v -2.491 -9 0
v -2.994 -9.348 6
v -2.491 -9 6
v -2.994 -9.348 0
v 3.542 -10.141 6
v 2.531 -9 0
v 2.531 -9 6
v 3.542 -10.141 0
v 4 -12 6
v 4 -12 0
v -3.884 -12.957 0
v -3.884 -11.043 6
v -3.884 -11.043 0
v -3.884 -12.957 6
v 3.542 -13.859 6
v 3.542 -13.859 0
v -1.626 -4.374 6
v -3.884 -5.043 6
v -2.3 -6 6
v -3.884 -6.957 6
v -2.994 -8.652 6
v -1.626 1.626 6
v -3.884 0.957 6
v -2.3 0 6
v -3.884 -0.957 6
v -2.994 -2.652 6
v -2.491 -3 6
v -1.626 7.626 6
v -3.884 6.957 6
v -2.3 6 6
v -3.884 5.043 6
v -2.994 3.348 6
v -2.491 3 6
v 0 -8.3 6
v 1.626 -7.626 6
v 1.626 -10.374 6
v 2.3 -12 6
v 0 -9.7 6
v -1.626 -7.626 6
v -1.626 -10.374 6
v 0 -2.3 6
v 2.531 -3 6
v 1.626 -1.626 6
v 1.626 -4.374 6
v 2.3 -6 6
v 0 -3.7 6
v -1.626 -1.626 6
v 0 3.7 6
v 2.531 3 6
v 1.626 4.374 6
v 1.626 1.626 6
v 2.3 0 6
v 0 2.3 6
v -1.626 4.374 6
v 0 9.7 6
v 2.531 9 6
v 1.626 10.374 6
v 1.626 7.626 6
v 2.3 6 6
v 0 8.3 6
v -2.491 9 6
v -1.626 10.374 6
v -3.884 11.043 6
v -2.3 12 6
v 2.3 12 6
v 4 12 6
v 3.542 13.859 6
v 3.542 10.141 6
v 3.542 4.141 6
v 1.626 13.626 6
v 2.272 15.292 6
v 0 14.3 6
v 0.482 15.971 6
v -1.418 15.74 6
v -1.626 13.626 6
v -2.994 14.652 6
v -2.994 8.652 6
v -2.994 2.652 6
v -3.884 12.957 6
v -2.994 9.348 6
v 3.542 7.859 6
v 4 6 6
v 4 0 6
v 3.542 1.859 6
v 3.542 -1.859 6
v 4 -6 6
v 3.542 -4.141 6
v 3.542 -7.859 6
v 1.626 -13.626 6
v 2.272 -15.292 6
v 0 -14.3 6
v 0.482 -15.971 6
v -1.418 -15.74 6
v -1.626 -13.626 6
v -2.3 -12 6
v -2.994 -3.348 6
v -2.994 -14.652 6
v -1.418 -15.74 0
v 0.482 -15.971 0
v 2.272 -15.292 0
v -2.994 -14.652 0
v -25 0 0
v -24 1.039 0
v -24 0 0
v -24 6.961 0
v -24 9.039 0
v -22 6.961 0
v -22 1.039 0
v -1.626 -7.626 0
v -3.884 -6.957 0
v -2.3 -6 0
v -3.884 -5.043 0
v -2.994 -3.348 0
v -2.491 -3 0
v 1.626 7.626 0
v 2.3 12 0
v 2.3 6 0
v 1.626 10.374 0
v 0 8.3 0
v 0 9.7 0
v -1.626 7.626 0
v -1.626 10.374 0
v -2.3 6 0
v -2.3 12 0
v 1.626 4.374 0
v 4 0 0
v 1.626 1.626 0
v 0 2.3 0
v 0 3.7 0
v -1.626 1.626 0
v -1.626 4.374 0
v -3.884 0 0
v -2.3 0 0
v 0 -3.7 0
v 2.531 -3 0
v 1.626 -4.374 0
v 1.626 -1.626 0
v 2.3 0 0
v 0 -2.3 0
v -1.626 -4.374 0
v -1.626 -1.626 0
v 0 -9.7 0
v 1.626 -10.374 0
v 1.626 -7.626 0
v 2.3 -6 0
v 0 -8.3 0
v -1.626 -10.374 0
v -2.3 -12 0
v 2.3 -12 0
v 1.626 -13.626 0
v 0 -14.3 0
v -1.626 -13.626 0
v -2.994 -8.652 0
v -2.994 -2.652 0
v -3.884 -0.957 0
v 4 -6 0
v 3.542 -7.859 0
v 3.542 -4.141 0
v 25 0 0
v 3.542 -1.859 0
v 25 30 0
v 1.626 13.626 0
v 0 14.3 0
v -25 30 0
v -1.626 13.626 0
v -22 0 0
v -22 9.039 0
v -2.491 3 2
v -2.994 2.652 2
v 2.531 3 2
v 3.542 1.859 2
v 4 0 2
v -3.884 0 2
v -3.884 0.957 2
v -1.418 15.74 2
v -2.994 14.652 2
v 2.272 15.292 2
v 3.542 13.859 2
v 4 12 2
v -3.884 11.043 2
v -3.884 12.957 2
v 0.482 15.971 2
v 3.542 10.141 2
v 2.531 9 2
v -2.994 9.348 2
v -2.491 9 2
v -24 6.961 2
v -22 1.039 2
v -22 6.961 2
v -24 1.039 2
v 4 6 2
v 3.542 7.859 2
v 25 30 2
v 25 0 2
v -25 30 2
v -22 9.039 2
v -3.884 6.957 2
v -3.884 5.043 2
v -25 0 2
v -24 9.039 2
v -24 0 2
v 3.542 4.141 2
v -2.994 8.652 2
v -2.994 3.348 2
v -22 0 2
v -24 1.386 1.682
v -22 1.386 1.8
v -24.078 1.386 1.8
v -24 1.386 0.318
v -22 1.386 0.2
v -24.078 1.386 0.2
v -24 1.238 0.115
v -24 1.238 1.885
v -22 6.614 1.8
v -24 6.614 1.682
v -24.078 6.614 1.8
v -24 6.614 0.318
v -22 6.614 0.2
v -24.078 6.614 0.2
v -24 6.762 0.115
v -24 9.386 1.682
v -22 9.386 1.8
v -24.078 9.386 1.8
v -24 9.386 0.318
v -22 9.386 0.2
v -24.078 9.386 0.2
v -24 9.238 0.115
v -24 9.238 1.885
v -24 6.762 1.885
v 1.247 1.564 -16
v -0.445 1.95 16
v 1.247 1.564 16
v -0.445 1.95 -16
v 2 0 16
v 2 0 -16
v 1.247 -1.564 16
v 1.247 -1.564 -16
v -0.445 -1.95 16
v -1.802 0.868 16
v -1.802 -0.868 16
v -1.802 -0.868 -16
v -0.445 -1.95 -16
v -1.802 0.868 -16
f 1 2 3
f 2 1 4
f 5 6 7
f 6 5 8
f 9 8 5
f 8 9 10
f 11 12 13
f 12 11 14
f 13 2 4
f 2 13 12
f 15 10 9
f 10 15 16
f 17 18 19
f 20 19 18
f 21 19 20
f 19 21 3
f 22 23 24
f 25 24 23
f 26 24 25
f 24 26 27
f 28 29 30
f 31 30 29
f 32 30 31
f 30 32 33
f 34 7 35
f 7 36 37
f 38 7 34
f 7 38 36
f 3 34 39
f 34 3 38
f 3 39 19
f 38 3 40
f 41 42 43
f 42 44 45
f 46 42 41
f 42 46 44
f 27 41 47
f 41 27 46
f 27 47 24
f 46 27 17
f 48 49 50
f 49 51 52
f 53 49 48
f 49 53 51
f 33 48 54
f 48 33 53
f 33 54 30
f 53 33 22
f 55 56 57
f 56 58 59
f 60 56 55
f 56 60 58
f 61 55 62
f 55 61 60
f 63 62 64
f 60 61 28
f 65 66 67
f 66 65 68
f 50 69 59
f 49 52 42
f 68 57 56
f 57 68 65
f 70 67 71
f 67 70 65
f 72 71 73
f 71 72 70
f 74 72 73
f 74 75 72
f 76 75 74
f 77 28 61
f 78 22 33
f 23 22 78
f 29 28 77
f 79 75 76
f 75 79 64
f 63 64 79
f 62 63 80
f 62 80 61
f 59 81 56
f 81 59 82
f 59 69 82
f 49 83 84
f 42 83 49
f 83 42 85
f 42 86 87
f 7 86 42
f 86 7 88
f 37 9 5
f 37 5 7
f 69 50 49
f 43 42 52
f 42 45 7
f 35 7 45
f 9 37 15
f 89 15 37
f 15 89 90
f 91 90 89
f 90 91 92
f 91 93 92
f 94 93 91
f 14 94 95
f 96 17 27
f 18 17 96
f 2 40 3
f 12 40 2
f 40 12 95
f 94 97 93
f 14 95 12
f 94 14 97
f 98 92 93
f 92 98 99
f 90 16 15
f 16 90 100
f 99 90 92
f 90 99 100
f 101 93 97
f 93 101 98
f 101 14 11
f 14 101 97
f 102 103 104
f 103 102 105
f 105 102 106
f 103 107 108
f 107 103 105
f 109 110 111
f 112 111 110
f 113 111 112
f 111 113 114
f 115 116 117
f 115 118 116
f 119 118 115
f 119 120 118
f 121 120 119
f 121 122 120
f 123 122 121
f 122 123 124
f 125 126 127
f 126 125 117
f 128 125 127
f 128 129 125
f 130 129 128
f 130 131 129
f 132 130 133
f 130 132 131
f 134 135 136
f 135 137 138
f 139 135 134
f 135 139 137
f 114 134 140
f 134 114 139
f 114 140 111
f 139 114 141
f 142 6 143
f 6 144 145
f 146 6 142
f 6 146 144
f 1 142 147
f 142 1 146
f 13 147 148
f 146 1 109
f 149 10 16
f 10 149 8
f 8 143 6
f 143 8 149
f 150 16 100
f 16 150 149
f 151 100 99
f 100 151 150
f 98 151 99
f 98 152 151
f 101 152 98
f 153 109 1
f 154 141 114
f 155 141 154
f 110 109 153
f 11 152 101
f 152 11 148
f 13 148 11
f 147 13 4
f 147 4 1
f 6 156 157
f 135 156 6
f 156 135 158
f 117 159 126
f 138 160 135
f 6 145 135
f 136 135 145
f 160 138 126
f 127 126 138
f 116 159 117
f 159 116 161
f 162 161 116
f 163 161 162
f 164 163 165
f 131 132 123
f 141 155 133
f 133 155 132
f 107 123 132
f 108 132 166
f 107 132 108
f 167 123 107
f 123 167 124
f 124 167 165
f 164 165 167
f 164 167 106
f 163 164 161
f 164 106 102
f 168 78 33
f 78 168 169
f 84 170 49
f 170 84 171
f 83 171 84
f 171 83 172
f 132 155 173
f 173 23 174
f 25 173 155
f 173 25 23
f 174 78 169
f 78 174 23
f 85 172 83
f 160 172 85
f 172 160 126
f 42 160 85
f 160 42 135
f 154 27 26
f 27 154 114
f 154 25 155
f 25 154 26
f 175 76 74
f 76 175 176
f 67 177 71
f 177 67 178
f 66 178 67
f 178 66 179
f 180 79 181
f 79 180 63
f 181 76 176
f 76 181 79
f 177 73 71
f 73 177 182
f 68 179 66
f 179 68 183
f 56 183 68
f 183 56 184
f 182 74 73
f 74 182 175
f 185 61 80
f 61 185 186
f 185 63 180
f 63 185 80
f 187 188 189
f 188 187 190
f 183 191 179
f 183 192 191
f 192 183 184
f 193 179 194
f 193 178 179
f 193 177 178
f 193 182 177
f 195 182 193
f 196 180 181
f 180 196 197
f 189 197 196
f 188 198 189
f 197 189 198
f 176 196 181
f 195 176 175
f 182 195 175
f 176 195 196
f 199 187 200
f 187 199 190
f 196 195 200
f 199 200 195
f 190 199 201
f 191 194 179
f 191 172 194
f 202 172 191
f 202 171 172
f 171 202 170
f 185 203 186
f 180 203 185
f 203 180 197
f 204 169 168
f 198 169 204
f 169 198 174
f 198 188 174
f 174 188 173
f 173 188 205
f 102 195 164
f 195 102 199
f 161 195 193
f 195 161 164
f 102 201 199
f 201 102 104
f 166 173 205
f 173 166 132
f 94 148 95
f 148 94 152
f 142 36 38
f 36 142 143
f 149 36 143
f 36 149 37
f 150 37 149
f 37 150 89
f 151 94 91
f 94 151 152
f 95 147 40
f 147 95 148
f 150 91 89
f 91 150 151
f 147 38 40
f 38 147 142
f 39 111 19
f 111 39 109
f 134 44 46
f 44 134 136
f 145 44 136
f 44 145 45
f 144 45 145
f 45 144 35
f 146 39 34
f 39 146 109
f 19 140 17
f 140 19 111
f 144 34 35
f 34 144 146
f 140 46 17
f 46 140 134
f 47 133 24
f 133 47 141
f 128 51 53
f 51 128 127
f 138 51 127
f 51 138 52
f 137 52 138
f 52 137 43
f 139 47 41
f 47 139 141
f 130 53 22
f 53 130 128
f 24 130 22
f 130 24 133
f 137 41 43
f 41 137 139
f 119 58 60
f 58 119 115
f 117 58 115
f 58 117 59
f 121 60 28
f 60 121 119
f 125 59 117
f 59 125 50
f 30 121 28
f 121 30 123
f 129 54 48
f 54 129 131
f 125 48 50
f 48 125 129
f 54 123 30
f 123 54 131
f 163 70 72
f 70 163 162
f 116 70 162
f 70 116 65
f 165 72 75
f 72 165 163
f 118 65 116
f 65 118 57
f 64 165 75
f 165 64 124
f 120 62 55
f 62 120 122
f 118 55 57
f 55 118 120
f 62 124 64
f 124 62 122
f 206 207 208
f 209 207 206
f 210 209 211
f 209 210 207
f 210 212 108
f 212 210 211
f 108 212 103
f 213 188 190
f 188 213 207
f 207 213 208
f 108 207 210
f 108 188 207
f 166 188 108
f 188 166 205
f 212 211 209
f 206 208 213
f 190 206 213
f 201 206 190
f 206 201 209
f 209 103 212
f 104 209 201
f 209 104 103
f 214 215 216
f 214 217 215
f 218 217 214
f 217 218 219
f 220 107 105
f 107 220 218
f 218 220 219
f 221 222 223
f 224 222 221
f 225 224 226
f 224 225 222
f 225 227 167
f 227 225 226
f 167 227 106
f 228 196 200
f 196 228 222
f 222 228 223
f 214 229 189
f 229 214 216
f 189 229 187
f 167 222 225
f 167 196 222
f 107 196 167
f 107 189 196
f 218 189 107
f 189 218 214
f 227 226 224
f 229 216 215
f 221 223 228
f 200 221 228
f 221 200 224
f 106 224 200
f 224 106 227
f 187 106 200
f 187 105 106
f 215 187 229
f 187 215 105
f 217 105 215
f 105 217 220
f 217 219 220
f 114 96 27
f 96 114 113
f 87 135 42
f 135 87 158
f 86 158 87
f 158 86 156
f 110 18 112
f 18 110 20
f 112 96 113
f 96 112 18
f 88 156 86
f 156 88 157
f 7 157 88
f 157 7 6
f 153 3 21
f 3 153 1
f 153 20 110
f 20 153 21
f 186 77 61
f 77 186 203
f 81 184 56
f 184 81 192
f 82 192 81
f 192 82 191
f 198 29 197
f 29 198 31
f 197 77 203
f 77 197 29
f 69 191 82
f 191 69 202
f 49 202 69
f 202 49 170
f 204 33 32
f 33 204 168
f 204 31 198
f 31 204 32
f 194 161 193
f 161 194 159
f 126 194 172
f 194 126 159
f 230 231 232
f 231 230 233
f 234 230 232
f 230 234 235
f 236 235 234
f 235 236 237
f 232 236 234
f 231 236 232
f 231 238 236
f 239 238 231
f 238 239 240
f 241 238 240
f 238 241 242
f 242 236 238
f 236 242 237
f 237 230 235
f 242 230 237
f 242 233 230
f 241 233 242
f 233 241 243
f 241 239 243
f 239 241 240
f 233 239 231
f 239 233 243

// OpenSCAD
// 家具用小型バット蝶番 (Butt Hinge)
// 3つのパーツ: 左板(Left Leaf), 右板(Right Leaf), ピン軸(Pin)

// --- パラメータ設定 ---
leaf_w = 25;          // 横幅 (回転方向)
leaf_h = 30;          // 縦幅 (ピン軸方向)
leaf_t = 2;           // 厚さ
pin_d = 4;            // ピン軸直径
pin_l = 32;           // ピン軸長さ
knuckle_d = 8;        // Knuckle外径
knuckle_id = 4.6;     // Knuckle内径 (4.0 + 0.3*2)
knuckle_h = 6;        // 各Knuckleの高さ (30mm / 5)
m3_hole_d = 3.2;      // M3貫通穴直径
m3_csc_d = 6;         // 皿穴直径
m3_csc_dep = 1;       // 皿穴深さ
m3_pitch = 8;         // 穴ピッチ

// --- モジュール定義 ---

// 皿穴と貫通穴
module m3_hole() {
    difference() {
        // 貫通穴
        cylinder(h = leaf_t + 1, d = m3_hole_d, center = false);
        // 皿穴 (表面から1mmのテーパー)
        translate([0, 0, -0.5])
            cylinder(h = m3_csc_dep + 0.5, d1 = m3_csc_d, d2 = m3_hole_d, center = false);
    }
}

// 片側の板 (Knuckleを含む)
module leaf_part(is_left = true) {
    // 座標のオフセット: 左板は -25 から 0、右板は 0 から 25 に配置
    offset_x = is_left ? -leaf_w : 0;
    
    difference() {
        union() {
            // 板本体
            translate([offset_x, 0, 0])
                cube([leaf_w, leaf_h, leaf_t]);
            
            // Knuckleの配置
            // 中心をY=0とするため、各位置から15mm引く
            // 左板は外側2個(15, -15) + 中央1個(0) = {-12, 0, 12}
            // 右板は中間2個 = {-6, 6}
            if (is_left) {
                for (y_pos = [-12, 0, 12]) {
                    translate([0, y_pos, 0])
                        cylinder(h = knuckle_h, d = knuckle_d, center = false);
                }
            } else {
                for (y_pos = [-6, 6]) {
                    translate([0, y_pos, 0])
                        cylinder(h = knuckle_h, d = knuckle_d, center = false);
                }
            }
        }
        
        // ピン軸の通り道（Knuckle内）をくり抜く
        // 全てのKnuckle位置(-12, -6, 0, 6, 12)に対して穴をあける
        for (y_pos = [-12, -6, 0, 6, 12]) {
            translate([0, y_pos, -1])
                cylinder(h = knuckle_h + 2, d = knuckle_id, center = false);
        }
        
        // M3穴の配置 (Knuckleから離れた側)
        // 板の端 (X = -25 または X = 25) に配置
        // 皿穴は表面（Z方向）に掘る
        for (y_pos = [-8, 0, 8]) {
            translate([is_left ? -leaf_w : leaf_w, y_pos, leaf_t/2])
                rotate([0, 90, 0])
                    m3_hole();
        }
    }
}

// --- 組み立て ---

// 左板 (x < 0 側に伸びる)
leaf_part(is_left = true);

// 右板 (x > 0 側に伸びる)
leaf_part(is_left = false);

// ピン軸 (中心をY軸に重ねる)
// 長さ32mm、両端1mmずつKnuckleから飛び出す
// Knuckleの範囲はY=-15〜15なので、中心を0にすると両端1mmずつ飛び出す
translate([0, 0, 0])
    cylinder(h = pin_l, d = pin_d, center = true);
